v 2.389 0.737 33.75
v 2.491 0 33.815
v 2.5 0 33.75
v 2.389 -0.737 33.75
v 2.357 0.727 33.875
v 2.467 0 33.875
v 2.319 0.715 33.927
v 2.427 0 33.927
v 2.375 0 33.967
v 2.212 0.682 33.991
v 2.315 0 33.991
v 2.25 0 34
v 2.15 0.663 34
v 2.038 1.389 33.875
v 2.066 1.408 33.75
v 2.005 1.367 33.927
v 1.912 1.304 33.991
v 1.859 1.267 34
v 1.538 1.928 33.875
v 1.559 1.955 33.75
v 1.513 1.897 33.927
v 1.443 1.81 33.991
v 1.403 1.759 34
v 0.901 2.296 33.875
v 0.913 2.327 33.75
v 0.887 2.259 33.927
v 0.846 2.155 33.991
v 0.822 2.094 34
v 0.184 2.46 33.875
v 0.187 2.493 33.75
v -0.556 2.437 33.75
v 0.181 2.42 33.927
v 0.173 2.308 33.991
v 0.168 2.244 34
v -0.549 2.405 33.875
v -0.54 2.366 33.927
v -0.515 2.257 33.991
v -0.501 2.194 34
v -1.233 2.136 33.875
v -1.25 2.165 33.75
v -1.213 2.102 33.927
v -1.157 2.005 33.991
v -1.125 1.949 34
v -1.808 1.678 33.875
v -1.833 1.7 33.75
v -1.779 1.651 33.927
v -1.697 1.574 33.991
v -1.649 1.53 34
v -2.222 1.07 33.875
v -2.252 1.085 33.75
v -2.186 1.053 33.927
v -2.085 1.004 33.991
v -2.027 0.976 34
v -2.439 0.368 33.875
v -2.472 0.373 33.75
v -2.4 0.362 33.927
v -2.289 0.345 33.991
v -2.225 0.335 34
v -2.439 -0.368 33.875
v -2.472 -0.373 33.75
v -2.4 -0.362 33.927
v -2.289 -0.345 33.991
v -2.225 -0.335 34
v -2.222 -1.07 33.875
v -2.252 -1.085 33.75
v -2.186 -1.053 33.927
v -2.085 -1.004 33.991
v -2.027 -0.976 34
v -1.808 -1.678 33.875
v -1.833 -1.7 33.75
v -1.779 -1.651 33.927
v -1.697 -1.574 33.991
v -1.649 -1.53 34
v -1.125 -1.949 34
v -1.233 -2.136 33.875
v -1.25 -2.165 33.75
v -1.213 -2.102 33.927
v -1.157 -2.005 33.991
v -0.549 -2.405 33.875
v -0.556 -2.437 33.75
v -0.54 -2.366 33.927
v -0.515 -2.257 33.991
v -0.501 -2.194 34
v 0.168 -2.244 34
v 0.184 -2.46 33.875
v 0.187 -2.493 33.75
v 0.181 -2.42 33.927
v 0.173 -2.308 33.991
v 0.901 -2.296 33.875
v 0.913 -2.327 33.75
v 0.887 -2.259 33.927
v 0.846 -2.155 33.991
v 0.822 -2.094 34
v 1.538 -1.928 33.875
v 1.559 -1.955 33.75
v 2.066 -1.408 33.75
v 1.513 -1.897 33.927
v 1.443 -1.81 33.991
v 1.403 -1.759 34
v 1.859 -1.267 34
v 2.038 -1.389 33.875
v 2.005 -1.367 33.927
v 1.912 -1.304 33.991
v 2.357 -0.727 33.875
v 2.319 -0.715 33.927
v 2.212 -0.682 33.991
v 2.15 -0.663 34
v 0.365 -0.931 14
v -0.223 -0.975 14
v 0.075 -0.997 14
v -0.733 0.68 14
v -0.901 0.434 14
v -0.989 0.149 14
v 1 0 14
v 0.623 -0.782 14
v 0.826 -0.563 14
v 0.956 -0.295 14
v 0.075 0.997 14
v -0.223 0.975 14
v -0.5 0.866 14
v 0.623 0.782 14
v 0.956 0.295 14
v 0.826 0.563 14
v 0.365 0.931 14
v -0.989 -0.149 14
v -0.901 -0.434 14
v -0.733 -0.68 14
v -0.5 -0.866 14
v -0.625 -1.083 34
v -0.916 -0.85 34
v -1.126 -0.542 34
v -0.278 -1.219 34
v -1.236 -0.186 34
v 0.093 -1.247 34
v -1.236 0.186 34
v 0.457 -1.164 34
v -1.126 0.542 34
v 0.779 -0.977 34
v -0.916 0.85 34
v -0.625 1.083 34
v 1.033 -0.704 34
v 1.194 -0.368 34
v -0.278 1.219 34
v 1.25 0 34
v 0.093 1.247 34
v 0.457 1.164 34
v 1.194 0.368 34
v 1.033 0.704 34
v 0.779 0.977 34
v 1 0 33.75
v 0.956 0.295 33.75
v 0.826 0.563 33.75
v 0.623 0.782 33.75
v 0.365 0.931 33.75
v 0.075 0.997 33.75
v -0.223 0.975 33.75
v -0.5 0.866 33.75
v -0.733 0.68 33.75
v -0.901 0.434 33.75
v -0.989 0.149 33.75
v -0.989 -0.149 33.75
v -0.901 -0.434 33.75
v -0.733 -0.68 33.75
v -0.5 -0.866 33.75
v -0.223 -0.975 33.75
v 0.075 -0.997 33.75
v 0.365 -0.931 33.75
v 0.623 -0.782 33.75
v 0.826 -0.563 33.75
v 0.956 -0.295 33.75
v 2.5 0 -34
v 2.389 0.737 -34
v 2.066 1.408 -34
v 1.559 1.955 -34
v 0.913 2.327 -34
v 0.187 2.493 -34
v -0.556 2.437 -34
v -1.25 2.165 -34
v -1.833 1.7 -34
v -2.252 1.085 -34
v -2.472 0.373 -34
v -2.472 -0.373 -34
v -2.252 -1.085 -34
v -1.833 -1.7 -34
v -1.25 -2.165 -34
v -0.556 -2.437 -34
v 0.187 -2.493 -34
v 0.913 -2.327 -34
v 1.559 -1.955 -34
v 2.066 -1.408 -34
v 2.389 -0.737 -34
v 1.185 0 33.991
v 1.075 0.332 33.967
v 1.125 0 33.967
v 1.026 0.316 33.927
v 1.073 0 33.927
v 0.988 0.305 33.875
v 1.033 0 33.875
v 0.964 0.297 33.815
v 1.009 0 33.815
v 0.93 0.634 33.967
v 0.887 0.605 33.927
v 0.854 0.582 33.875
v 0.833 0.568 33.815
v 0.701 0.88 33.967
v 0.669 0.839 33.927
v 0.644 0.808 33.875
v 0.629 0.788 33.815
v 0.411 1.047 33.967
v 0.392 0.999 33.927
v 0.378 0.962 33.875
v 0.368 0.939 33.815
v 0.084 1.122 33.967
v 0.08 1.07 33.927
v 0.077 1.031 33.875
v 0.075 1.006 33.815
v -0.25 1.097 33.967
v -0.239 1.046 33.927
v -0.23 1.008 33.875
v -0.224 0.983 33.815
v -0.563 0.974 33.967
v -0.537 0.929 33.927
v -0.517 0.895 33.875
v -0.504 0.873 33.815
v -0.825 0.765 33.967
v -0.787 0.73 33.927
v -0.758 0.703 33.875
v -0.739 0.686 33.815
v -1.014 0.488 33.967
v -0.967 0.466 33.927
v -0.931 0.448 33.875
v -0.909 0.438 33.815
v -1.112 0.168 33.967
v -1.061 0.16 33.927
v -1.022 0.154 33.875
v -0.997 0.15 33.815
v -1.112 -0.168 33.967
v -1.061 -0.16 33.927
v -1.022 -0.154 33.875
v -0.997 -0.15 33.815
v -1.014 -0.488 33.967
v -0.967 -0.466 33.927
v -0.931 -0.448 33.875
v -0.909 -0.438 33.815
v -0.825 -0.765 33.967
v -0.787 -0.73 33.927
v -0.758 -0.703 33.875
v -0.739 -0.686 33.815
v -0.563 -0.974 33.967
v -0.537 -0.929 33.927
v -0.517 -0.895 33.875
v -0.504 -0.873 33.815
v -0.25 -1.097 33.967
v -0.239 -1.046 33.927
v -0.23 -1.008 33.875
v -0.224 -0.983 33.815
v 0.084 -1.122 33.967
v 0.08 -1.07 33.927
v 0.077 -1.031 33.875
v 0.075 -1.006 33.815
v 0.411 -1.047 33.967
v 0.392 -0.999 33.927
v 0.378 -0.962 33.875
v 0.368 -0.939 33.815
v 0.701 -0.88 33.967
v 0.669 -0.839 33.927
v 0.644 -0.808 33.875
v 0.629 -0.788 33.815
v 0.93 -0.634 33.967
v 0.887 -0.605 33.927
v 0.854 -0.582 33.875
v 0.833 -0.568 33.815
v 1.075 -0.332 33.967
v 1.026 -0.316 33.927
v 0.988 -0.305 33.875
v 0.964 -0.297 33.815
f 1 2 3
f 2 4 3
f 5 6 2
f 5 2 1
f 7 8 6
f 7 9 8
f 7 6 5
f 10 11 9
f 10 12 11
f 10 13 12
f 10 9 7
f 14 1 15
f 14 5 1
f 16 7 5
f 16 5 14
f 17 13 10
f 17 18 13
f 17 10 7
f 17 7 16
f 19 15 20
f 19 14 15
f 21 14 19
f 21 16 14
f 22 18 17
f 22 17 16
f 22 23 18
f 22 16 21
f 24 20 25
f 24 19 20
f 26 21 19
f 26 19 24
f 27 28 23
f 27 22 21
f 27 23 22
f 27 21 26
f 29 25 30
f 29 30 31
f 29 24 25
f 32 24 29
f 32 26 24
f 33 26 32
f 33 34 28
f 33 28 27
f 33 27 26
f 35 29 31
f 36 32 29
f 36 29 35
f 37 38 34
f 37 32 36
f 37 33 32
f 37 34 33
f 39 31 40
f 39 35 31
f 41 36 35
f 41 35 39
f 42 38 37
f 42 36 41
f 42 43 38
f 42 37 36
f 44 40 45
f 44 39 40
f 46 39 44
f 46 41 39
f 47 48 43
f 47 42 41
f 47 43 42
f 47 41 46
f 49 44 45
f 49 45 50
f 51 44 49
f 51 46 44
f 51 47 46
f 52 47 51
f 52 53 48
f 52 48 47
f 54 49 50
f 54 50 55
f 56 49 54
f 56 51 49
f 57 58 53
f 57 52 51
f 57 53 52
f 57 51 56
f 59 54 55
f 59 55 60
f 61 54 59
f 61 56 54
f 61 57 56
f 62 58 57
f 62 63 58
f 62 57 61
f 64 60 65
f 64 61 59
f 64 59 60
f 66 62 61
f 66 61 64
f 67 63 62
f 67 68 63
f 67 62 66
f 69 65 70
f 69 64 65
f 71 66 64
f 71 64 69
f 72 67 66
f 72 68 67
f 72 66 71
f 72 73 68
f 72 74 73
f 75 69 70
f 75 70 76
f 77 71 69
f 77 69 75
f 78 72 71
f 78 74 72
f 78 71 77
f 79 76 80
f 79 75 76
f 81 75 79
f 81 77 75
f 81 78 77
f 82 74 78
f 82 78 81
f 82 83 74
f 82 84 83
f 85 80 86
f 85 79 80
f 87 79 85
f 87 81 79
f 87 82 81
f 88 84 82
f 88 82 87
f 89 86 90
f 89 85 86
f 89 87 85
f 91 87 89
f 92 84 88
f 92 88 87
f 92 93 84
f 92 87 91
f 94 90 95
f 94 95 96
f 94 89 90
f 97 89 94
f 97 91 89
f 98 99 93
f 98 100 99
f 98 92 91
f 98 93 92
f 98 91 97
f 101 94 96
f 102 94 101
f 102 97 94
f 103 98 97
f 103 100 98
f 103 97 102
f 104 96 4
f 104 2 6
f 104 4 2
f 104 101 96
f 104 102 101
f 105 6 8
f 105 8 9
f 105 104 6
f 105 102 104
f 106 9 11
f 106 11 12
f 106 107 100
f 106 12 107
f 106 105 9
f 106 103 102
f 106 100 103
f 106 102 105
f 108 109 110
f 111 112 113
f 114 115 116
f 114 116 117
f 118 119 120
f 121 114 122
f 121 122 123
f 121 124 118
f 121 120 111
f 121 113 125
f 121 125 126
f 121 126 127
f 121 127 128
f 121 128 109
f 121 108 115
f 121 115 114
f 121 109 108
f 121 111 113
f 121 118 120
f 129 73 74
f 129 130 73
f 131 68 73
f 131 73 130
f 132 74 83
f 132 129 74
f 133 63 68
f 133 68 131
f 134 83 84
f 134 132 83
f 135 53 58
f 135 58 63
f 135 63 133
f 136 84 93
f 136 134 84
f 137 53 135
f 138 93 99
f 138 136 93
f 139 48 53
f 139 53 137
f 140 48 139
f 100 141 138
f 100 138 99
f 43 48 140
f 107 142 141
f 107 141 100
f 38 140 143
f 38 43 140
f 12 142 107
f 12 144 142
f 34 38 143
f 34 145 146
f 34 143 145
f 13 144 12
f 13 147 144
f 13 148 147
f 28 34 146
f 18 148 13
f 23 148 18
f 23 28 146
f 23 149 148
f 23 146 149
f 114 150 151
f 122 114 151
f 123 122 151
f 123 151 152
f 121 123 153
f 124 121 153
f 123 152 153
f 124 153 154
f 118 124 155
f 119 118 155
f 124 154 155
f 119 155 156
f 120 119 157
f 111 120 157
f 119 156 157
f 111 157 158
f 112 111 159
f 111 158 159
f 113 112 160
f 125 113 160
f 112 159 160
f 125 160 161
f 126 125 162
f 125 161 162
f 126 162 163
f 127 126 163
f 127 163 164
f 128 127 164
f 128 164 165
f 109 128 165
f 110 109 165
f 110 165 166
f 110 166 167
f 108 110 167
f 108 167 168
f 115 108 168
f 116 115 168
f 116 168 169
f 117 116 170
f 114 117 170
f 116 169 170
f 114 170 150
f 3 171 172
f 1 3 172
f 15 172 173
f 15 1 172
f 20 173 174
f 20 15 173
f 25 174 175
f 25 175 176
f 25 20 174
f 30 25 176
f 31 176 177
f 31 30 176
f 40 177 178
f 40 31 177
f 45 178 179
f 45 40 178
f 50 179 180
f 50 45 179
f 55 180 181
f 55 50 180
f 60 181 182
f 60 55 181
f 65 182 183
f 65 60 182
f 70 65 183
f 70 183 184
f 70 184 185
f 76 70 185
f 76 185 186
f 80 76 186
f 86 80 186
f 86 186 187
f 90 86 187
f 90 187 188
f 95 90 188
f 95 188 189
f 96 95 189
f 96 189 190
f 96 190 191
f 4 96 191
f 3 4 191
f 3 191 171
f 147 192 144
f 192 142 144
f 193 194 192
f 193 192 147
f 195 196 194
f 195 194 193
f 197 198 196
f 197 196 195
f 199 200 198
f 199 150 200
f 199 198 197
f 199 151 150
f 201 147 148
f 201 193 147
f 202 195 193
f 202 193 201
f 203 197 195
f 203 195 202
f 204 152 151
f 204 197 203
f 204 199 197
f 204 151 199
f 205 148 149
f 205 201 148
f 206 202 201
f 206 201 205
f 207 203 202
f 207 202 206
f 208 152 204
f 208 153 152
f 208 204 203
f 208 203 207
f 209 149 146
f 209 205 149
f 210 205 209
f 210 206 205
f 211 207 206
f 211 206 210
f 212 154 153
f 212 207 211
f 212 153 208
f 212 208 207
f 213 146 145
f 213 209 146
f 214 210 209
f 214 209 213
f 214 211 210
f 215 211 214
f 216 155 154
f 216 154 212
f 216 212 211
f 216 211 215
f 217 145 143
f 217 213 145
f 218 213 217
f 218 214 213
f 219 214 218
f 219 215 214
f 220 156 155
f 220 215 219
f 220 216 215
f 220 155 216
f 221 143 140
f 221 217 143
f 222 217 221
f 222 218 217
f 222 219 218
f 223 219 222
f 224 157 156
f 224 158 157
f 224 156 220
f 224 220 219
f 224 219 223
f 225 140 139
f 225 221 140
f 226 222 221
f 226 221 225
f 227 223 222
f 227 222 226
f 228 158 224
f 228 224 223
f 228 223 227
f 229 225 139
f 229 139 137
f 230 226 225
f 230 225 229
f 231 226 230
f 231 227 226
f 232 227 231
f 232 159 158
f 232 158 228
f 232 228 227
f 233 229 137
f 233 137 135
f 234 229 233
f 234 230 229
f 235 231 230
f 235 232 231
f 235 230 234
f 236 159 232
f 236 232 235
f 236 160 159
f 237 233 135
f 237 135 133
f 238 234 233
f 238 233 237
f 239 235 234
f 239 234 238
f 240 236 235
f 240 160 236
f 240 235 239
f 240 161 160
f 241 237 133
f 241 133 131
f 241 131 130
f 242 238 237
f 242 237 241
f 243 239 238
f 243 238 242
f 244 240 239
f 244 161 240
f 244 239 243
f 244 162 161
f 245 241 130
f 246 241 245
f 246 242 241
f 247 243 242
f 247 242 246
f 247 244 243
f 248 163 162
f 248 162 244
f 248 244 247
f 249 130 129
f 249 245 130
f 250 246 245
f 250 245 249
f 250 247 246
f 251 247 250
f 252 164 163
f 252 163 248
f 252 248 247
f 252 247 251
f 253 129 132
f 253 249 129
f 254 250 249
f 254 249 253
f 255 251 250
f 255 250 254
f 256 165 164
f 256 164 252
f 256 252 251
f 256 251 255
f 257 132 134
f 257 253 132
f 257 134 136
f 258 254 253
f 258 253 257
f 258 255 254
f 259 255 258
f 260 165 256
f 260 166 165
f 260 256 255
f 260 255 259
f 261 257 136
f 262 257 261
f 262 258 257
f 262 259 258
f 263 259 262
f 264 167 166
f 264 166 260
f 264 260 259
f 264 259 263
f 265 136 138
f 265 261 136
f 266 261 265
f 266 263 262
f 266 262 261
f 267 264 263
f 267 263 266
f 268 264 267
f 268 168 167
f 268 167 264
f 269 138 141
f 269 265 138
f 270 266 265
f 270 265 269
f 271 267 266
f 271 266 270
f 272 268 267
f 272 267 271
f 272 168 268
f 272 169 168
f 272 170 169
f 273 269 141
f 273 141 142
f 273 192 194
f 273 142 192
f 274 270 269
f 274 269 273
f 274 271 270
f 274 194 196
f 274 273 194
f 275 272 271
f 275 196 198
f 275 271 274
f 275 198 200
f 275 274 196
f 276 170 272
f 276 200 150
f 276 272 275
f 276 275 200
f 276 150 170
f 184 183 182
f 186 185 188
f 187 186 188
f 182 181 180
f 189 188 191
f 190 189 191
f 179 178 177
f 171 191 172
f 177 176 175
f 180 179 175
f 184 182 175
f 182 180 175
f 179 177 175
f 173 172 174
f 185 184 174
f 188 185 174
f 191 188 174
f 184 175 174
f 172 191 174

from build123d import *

# Parameters (mm, degrees)
SKETCH1_R           = 2.5
BOSS_EXTRUDE1_DEPTH = 34
SKETCH2_R           = 1
CUT_EXTRUDE1_DEPTH  = 20
FILLET1_R           = 0.25


with BuildPart() as part:
    # Sketch1 → Boss-Extrude1 (new body, symmetric)
    with BuildSketch(Plane.XY):
        Circle(SKETCH1_R)
    extrude(amount=BOSS_EXTRUDE1_DEPTH, both=True)

    # Sketch2 → Cut-Extrude1 (cut)
    with BuildSketch(Plane.XY.offset(34)):
        Circle(SKETCH2_R)
    extrude(amount=-CUT_EXTRUDE1_DEPTH, mode=Mode.SUBTRACT)

    # Fillet1
    fillet1_edges = [part.edges().sort_by_distance(p)[0] for p in [
        (-2.5, 0, 34),
        (-1, 0, 34),
    ]]
    fillet(fillet1_edges, radius=FILLET1_R)


solid = part.part
